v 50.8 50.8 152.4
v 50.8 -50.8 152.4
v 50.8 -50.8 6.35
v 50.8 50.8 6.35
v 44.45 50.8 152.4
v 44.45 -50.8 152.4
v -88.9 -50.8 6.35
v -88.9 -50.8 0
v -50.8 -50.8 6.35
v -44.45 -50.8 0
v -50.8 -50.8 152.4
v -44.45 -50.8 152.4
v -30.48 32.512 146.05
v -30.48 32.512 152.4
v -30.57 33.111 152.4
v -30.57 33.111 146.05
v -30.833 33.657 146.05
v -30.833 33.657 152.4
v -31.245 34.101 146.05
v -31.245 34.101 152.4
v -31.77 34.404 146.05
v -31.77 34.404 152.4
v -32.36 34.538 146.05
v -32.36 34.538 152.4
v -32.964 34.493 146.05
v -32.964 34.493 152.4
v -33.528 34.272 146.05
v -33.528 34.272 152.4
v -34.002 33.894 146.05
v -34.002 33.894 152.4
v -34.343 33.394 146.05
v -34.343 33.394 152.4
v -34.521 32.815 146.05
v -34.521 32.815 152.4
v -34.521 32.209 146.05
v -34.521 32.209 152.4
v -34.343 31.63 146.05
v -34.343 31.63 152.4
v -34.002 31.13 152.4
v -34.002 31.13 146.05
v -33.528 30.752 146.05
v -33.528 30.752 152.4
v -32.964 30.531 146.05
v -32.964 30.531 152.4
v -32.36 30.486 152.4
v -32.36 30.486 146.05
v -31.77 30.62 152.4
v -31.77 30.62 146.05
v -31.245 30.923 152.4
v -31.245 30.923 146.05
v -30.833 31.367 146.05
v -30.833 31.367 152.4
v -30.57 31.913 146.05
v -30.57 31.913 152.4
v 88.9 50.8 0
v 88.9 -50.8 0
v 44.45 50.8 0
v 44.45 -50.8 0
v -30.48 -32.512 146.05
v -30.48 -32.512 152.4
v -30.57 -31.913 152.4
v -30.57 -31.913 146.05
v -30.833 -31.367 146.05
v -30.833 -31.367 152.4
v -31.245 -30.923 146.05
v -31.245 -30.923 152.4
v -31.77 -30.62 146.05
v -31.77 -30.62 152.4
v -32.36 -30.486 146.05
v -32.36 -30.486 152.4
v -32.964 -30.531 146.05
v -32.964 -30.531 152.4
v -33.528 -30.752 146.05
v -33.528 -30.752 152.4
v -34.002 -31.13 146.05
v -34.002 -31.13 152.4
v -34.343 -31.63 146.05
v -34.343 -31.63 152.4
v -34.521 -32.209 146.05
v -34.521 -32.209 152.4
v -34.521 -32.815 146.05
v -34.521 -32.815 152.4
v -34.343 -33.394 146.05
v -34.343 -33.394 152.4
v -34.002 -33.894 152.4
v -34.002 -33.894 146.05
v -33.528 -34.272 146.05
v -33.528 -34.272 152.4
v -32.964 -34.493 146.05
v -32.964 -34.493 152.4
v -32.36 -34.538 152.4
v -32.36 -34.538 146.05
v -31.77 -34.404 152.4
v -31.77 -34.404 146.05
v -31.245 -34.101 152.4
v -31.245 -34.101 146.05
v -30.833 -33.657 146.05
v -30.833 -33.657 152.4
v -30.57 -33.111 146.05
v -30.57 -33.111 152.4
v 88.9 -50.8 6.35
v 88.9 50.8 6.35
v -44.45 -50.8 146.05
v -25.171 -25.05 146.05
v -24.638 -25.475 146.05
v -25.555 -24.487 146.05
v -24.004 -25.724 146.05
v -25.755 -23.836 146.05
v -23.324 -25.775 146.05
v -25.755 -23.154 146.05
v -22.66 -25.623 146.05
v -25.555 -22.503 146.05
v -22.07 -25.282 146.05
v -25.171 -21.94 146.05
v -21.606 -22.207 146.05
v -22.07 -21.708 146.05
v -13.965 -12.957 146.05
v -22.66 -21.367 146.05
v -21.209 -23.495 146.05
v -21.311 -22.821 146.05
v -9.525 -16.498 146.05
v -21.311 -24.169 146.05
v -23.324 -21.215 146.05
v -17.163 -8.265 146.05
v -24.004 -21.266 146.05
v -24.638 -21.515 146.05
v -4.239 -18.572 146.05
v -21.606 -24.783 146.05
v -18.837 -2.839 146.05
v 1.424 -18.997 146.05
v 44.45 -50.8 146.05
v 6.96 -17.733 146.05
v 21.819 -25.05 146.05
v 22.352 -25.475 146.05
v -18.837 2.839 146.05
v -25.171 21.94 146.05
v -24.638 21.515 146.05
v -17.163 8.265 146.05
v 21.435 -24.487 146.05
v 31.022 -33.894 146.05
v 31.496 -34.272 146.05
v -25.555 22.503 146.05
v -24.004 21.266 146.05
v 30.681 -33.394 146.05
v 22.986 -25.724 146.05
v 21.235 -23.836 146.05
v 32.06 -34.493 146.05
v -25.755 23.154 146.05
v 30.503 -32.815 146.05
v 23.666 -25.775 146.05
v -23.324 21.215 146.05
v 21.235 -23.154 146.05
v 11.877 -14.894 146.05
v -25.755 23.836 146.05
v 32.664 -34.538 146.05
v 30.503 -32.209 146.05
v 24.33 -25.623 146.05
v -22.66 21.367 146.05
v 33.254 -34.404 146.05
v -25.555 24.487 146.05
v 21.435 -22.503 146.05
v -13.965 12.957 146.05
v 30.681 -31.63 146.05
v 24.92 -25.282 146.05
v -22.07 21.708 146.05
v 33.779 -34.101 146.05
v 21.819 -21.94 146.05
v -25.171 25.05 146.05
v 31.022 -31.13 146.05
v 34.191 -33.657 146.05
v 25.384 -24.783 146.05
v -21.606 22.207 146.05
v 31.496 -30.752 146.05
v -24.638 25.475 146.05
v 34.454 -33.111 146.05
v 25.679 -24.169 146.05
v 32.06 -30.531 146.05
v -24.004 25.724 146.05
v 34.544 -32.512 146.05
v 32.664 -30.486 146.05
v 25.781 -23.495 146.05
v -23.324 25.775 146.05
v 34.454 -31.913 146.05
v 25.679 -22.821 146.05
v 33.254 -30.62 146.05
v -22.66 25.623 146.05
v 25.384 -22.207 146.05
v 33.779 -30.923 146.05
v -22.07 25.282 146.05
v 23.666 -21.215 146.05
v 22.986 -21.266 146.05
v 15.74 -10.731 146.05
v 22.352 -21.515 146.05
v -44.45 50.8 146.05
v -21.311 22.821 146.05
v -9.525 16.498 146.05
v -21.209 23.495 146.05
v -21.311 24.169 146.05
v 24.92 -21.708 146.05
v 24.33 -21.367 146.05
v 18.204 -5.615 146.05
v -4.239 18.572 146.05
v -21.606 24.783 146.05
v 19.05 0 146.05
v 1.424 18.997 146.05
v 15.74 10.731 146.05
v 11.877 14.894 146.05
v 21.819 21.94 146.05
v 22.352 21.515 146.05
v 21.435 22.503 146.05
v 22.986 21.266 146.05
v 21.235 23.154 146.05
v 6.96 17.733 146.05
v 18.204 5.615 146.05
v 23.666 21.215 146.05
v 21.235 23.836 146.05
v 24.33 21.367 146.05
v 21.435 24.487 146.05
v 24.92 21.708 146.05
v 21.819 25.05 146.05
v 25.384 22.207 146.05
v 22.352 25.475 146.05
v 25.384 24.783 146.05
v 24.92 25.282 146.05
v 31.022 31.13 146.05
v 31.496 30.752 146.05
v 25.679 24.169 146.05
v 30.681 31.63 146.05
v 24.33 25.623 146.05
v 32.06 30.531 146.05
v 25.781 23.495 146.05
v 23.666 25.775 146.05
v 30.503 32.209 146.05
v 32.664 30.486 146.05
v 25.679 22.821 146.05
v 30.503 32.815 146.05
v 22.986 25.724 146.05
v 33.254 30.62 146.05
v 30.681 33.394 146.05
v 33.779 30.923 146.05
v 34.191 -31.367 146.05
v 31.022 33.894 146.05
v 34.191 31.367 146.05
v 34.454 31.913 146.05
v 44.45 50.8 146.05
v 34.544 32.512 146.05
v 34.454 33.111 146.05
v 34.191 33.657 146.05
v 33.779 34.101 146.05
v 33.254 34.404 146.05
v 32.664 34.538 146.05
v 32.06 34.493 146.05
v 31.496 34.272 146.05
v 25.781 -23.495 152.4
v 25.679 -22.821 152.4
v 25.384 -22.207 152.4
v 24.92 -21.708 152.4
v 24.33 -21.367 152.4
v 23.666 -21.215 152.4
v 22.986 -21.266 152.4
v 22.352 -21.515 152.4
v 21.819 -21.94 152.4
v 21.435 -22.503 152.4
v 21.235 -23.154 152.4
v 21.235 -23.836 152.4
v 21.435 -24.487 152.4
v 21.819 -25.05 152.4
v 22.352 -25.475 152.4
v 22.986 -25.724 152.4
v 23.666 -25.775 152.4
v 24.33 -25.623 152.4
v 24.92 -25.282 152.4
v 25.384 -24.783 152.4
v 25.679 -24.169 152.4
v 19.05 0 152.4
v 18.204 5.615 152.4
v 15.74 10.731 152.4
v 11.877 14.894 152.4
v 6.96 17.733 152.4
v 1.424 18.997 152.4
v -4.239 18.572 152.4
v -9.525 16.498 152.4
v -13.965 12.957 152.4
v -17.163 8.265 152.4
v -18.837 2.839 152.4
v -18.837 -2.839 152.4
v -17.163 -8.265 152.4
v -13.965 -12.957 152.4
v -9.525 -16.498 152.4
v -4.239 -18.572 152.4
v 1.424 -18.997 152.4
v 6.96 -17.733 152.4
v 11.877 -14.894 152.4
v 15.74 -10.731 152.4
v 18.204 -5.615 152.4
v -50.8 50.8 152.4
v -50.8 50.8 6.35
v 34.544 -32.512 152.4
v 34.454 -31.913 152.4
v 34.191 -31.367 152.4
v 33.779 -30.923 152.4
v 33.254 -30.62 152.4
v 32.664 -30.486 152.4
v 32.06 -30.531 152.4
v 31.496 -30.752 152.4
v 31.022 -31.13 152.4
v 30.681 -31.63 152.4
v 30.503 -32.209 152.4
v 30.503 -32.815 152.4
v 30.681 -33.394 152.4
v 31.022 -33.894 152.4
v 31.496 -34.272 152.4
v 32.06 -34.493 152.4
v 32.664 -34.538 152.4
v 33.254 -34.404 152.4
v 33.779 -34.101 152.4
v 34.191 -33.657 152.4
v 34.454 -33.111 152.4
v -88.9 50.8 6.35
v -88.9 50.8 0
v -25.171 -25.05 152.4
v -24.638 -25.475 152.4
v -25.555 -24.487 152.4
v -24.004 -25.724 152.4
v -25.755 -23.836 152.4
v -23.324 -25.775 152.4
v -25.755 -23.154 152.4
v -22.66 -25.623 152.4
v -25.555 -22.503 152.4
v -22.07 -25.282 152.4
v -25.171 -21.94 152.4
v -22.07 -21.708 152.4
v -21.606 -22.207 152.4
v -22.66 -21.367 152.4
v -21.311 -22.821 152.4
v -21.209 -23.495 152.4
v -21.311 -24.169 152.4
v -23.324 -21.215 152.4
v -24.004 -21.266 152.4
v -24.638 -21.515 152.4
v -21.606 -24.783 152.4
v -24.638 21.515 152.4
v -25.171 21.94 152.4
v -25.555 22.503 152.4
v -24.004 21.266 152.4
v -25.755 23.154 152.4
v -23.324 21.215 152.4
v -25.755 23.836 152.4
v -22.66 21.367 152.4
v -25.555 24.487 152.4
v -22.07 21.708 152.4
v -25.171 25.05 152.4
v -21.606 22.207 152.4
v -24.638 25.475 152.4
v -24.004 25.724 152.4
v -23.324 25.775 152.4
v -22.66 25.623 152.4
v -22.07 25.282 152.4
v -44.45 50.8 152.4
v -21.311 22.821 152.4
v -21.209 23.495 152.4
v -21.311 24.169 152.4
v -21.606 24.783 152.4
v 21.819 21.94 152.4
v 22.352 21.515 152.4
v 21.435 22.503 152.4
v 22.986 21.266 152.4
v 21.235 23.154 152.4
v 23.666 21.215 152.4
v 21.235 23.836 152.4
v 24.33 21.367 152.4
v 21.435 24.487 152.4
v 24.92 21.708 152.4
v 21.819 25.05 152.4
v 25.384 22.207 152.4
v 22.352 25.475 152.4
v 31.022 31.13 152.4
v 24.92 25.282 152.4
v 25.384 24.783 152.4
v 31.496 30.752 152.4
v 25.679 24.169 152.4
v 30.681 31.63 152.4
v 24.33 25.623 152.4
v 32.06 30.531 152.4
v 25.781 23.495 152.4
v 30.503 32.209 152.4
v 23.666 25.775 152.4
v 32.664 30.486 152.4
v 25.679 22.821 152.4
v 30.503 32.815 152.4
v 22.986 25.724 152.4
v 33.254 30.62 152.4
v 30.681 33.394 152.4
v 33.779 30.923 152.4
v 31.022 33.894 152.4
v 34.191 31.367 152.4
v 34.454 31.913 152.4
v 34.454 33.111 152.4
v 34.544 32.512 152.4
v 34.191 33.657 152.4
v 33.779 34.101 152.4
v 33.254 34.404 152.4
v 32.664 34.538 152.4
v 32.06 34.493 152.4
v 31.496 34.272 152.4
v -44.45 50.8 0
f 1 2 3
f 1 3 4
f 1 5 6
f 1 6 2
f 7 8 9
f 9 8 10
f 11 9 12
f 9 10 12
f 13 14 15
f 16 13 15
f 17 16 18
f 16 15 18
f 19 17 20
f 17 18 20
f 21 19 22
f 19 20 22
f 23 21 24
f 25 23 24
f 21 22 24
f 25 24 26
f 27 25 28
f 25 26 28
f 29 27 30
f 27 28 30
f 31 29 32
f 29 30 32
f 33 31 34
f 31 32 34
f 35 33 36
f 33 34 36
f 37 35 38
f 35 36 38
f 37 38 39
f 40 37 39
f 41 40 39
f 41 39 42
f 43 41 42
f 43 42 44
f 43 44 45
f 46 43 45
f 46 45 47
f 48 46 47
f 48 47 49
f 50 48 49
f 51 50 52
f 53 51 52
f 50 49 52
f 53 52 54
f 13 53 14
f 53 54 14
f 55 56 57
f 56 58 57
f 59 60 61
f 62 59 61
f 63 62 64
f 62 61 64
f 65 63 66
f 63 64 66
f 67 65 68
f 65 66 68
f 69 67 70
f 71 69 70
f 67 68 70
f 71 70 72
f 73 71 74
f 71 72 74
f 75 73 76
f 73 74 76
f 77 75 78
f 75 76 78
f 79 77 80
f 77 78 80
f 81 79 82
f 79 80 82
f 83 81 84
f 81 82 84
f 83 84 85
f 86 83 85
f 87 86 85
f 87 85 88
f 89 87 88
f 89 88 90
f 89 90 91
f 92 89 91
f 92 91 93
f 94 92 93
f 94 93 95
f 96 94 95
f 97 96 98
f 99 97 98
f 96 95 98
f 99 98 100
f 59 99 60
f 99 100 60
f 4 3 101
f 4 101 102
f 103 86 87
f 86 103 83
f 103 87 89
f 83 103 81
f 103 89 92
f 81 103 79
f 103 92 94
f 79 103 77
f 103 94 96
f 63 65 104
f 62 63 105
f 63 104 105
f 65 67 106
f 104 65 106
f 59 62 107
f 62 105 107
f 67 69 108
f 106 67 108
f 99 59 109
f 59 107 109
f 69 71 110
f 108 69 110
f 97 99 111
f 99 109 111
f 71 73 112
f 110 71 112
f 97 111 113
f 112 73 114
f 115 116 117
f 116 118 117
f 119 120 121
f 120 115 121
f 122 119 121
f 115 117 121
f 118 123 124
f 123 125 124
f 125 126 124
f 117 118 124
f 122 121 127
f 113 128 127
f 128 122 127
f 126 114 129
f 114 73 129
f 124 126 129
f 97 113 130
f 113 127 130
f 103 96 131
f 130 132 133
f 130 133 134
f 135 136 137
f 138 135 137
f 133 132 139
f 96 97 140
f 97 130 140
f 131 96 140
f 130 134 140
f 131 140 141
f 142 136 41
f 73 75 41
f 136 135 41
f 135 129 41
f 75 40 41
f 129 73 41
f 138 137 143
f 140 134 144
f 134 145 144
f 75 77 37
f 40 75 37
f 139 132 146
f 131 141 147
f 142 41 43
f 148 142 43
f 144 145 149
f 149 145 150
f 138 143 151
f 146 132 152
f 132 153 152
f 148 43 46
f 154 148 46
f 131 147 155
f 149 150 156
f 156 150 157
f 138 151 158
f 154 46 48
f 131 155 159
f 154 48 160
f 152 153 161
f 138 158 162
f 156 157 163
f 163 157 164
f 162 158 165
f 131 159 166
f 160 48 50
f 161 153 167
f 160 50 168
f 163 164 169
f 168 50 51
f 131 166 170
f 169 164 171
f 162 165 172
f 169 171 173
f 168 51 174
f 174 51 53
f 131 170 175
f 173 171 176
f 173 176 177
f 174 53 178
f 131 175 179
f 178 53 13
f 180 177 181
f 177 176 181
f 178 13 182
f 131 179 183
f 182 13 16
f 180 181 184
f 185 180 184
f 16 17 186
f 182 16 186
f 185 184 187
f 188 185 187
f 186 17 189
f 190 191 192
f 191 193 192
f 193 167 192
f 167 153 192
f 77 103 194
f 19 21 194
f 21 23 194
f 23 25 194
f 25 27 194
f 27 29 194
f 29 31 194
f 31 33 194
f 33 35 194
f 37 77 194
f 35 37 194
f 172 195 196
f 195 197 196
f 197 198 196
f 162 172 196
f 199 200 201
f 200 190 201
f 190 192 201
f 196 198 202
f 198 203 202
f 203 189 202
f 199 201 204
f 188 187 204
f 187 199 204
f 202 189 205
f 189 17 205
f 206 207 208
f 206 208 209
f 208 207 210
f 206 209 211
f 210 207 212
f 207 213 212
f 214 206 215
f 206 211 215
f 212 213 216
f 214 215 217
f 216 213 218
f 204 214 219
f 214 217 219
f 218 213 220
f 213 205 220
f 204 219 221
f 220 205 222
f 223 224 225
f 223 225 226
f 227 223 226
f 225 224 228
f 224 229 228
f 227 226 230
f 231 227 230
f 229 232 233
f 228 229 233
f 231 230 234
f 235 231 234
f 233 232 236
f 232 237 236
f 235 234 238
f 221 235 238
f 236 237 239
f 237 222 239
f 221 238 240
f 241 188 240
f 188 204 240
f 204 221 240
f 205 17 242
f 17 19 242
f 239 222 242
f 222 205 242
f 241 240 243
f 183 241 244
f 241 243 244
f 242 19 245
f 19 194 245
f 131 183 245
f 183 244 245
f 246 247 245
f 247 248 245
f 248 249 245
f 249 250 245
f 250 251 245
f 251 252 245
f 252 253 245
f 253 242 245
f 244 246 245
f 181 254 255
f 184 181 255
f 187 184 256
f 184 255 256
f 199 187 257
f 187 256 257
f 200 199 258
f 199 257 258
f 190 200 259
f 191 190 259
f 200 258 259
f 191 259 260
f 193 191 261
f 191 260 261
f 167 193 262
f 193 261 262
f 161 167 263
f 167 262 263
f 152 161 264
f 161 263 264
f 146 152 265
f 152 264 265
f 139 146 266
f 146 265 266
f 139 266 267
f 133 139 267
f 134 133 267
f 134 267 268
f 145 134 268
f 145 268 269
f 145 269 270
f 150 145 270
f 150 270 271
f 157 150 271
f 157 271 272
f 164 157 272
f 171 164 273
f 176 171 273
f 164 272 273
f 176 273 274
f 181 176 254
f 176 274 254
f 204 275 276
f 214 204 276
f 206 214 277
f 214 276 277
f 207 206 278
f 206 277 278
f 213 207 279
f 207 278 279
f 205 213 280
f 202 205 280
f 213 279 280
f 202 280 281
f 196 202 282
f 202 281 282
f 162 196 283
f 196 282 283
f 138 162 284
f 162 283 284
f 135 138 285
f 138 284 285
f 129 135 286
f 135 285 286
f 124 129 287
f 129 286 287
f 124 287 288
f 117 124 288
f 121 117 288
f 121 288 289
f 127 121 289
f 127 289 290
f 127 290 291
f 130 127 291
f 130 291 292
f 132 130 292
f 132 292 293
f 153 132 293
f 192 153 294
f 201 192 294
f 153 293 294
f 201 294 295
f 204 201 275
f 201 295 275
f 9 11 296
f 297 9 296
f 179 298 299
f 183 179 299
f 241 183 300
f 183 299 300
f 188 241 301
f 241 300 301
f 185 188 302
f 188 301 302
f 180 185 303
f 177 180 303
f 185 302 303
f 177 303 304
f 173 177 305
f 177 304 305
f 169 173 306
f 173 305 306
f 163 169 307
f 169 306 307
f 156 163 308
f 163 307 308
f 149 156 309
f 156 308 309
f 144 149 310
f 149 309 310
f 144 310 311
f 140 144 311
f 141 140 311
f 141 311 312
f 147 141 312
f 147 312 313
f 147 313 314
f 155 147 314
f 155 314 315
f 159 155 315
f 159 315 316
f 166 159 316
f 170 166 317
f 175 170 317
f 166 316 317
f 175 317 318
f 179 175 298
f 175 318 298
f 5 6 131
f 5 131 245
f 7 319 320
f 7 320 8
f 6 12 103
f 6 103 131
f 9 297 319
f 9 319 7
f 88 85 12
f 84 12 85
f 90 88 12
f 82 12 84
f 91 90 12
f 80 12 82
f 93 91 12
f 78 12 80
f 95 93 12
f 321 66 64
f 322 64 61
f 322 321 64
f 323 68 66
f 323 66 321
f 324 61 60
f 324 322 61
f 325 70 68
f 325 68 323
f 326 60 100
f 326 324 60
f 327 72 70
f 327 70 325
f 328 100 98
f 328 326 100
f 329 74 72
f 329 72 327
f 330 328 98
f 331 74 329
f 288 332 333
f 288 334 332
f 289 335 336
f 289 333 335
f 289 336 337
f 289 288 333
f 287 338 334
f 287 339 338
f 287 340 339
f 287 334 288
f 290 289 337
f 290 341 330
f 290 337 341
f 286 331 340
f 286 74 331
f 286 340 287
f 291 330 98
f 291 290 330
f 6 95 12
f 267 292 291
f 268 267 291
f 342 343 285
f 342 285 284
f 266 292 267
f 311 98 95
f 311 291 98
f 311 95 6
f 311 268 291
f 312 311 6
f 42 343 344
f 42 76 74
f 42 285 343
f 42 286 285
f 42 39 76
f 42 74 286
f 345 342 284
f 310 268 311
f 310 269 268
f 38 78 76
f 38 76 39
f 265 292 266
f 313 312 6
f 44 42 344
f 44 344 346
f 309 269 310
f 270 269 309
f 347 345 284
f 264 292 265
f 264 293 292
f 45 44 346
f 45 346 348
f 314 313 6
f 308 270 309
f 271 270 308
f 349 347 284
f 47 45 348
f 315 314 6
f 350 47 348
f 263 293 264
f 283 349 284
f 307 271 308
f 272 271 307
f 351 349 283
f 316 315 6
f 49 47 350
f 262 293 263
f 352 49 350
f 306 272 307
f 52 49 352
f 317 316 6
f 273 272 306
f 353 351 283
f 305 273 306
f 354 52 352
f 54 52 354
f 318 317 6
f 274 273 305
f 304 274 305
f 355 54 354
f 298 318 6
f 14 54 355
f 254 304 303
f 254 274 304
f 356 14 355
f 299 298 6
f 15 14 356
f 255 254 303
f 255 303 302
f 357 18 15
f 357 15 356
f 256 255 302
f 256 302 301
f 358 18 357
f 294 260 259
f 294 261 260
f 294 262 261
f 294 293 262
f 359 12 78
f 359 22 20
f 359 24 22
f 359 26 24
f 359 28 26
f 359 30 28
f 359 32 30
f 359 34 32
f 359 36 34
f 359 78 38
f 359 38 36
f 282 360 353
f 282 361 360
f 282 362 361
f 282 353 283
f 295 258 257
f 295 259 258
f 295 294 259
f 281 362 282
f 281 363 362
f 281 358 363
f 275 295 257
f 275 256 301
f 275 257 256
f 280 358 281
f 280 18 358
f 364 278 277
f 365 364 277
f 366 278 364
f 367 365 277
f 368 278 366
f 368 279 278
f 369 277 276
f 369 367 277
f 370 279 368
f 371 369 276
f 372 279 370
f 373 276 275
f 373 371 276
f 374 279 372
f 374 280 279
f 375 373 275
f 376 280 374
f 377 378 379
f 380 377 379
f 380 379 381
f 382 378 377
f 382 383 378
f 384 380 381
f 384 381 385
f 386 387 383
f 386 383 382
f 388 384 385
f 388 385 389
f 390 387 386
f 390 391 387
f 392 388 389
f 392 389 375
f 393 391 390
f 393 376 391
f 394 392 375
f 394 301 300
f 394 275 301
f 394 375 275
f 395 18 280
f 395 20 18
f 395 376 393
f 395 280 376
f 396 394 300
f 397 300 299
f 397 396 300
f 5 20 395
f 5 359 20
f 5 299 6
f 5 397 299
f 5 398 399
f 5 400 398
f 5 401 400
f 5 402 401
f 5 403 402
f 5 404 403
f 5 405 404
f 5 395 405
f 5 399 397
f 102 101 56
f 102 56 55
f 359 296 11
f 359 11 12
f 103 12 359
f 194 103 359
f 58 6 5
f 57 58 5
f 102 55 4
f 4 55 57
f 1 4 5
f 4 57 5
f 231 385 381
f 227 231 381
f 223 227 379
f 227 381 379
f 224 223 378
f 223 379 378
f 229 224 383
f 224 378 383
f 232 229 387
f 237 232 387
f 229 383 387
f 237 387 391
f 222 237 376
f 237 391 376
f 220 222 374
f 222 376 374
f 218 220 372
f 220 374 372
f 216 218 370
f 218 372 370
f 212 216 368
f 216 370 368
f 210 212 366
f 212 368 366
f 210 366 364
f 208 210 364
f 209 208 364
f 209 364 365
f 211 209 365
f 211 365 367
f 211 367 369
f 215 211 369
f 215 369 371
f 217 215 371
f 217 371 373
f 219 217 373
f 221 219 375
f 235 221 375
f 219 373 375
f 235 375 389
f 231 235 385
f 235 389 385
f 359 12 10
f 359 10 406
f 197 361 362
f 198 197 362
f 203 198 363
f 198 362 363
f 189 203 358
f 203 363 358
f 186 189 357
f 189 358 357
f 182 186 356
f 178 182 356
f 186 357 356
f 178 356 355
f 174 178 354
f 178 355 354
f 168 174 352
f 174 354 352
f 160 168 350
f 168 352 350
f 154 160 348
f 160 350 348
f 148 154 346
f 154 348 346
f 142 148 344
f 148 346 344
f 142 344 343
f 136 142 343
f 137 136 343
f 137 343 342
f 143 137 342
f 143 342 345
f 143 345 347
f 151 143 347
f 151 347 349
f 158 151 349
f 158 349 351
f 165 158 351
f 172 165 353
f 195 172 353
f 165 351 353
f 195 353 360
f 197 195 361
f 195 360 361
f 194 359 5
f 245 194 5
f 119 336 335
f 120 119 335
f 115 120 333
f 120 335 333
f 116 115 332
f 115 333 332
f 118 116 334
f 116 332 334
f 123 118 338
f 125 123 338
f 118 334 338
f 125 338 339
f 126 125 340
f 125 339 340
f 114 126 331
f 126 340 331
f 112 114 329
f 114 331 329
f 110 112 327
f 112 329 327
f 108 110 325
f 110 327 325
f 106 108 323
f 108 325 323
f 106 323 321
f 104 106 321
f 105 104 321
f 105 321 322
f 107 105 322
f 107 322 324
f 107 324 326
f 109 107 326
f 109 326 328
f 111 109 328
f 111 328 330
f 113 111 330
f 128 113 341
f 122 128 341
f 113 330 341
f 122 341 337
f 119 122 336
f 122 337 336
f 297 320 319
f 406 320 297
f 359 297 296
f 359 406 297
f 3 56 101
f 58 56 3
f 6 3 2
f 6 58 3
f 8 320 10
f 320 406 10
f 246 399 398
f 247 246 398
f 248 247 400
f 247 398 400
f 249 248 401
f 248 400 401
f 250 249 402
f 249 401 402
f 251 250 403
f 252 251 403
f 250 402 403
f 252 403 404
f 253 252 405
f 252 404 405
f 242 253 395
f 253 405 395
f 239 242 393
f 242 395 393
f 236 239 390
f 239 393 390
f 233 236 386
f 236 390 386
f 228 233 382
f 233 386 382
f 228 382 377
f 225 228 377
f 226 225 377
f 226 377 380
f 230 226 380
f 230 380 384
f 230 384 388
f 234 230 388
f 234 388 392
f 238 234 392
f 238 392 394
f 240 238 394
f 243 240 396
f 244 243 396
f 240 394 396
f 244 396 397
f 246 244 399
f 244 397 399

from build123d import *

# Parameters (mm, degrees)
F1_W     = 88.9
F1_H     = 101.6
F1_R     = 2.032
F1_R_2   = 2.286
F1_R_3   = 19.05
F2_DEPTH = 6.35
F1_W_2   = 6.35
F3_DEPTH = 152.4
F4_W     = 101.6
F4_H     = 6.35
F5_DEPTH = 38.1
F6_W     = 101.6
F6_H     = 6.35
F7_DEPTH = 38.1


with BuildPart() as f2:
    # F1 (on offset) → F2 (new body)
    with BuildSketch(Plane.XY.offset(152.4)):
        Rectangle(F1_W, F1_H)
        with Locations((-32.512, -32.512)):
            Circle(F1_R, mode=Mode.SUBTRACT)
        with Locations((-23.495, -23.495)):
            Circle(F1_R_2, mode=Mode.SUBTRACT)
        Circle(F1_R_3, mode=Mode.SUBTRACT)
        with Locations((32.512, -32.512)):
            Circle(F1_R, mode=Mode.SUBTRACT)
        with Locations((23.495, -23.495)):
            Circle(F1_R_2, mode=Mode.SUBTRACT)
        with Locations((-23.495, 23.495)):
            Circle(F1_R_2, mode=Mode.SUBTRACT)
        with Locations((-32.512, 32.512)):
            Circle(F1_R, mode=Mode.SUBTRACT)
        with Locations((23.495, 23.495)):
            Circle(F1_R_2, mode=Mode.SUBTRACT)
        with Locations((32.512, 32.512)):
            Circle(F1_R, mode=Mode.SUBTRACT)
    extrude(amount=-F2_DEPTH)


with BuildPart() as f3:
    # F1 (on offset) → F3 (new body)
    with BuildSketch(Plane.XY.offset(152.4)):
        with Locations((-47.625, 0)):
            Rectangle(F1_W_2, F1_H)
    extrude(amount=-F3_DEPTH)

    # F6 (on face) → F7 (join)
    with BuildSketch(Plane(origin=(-50.8, 0, 0), x_dir=(0, -1, 0), z_dir=(-1, 0, 0))):
        with Locations((0, 3.175)):
            Rectangle(F6_W, F6_H)
    extrude(amount=F7_DEPTH)


with BuildPart() as f3b:
    # F1 (on offset) → F3, piece 2 (new body)
    with BuildSketch(Plane.XY.offset(152.4)):
        with Locations((47.625, 0)):
            Rectangle(F1_W_2, F1_H)
    extrude(amount=-F3_DEPTH)

    # F4 (on face) → F5 (join)
    with BuildSketch(Plane.YZ.offset(50.8)):
        with Locations((0, 3.175)):
            Rectangle(F4_W, F4_H)
    extrude(amount=F5_DEPTH)


solid = Compound([f2.part, f3.part, f3b.part])
